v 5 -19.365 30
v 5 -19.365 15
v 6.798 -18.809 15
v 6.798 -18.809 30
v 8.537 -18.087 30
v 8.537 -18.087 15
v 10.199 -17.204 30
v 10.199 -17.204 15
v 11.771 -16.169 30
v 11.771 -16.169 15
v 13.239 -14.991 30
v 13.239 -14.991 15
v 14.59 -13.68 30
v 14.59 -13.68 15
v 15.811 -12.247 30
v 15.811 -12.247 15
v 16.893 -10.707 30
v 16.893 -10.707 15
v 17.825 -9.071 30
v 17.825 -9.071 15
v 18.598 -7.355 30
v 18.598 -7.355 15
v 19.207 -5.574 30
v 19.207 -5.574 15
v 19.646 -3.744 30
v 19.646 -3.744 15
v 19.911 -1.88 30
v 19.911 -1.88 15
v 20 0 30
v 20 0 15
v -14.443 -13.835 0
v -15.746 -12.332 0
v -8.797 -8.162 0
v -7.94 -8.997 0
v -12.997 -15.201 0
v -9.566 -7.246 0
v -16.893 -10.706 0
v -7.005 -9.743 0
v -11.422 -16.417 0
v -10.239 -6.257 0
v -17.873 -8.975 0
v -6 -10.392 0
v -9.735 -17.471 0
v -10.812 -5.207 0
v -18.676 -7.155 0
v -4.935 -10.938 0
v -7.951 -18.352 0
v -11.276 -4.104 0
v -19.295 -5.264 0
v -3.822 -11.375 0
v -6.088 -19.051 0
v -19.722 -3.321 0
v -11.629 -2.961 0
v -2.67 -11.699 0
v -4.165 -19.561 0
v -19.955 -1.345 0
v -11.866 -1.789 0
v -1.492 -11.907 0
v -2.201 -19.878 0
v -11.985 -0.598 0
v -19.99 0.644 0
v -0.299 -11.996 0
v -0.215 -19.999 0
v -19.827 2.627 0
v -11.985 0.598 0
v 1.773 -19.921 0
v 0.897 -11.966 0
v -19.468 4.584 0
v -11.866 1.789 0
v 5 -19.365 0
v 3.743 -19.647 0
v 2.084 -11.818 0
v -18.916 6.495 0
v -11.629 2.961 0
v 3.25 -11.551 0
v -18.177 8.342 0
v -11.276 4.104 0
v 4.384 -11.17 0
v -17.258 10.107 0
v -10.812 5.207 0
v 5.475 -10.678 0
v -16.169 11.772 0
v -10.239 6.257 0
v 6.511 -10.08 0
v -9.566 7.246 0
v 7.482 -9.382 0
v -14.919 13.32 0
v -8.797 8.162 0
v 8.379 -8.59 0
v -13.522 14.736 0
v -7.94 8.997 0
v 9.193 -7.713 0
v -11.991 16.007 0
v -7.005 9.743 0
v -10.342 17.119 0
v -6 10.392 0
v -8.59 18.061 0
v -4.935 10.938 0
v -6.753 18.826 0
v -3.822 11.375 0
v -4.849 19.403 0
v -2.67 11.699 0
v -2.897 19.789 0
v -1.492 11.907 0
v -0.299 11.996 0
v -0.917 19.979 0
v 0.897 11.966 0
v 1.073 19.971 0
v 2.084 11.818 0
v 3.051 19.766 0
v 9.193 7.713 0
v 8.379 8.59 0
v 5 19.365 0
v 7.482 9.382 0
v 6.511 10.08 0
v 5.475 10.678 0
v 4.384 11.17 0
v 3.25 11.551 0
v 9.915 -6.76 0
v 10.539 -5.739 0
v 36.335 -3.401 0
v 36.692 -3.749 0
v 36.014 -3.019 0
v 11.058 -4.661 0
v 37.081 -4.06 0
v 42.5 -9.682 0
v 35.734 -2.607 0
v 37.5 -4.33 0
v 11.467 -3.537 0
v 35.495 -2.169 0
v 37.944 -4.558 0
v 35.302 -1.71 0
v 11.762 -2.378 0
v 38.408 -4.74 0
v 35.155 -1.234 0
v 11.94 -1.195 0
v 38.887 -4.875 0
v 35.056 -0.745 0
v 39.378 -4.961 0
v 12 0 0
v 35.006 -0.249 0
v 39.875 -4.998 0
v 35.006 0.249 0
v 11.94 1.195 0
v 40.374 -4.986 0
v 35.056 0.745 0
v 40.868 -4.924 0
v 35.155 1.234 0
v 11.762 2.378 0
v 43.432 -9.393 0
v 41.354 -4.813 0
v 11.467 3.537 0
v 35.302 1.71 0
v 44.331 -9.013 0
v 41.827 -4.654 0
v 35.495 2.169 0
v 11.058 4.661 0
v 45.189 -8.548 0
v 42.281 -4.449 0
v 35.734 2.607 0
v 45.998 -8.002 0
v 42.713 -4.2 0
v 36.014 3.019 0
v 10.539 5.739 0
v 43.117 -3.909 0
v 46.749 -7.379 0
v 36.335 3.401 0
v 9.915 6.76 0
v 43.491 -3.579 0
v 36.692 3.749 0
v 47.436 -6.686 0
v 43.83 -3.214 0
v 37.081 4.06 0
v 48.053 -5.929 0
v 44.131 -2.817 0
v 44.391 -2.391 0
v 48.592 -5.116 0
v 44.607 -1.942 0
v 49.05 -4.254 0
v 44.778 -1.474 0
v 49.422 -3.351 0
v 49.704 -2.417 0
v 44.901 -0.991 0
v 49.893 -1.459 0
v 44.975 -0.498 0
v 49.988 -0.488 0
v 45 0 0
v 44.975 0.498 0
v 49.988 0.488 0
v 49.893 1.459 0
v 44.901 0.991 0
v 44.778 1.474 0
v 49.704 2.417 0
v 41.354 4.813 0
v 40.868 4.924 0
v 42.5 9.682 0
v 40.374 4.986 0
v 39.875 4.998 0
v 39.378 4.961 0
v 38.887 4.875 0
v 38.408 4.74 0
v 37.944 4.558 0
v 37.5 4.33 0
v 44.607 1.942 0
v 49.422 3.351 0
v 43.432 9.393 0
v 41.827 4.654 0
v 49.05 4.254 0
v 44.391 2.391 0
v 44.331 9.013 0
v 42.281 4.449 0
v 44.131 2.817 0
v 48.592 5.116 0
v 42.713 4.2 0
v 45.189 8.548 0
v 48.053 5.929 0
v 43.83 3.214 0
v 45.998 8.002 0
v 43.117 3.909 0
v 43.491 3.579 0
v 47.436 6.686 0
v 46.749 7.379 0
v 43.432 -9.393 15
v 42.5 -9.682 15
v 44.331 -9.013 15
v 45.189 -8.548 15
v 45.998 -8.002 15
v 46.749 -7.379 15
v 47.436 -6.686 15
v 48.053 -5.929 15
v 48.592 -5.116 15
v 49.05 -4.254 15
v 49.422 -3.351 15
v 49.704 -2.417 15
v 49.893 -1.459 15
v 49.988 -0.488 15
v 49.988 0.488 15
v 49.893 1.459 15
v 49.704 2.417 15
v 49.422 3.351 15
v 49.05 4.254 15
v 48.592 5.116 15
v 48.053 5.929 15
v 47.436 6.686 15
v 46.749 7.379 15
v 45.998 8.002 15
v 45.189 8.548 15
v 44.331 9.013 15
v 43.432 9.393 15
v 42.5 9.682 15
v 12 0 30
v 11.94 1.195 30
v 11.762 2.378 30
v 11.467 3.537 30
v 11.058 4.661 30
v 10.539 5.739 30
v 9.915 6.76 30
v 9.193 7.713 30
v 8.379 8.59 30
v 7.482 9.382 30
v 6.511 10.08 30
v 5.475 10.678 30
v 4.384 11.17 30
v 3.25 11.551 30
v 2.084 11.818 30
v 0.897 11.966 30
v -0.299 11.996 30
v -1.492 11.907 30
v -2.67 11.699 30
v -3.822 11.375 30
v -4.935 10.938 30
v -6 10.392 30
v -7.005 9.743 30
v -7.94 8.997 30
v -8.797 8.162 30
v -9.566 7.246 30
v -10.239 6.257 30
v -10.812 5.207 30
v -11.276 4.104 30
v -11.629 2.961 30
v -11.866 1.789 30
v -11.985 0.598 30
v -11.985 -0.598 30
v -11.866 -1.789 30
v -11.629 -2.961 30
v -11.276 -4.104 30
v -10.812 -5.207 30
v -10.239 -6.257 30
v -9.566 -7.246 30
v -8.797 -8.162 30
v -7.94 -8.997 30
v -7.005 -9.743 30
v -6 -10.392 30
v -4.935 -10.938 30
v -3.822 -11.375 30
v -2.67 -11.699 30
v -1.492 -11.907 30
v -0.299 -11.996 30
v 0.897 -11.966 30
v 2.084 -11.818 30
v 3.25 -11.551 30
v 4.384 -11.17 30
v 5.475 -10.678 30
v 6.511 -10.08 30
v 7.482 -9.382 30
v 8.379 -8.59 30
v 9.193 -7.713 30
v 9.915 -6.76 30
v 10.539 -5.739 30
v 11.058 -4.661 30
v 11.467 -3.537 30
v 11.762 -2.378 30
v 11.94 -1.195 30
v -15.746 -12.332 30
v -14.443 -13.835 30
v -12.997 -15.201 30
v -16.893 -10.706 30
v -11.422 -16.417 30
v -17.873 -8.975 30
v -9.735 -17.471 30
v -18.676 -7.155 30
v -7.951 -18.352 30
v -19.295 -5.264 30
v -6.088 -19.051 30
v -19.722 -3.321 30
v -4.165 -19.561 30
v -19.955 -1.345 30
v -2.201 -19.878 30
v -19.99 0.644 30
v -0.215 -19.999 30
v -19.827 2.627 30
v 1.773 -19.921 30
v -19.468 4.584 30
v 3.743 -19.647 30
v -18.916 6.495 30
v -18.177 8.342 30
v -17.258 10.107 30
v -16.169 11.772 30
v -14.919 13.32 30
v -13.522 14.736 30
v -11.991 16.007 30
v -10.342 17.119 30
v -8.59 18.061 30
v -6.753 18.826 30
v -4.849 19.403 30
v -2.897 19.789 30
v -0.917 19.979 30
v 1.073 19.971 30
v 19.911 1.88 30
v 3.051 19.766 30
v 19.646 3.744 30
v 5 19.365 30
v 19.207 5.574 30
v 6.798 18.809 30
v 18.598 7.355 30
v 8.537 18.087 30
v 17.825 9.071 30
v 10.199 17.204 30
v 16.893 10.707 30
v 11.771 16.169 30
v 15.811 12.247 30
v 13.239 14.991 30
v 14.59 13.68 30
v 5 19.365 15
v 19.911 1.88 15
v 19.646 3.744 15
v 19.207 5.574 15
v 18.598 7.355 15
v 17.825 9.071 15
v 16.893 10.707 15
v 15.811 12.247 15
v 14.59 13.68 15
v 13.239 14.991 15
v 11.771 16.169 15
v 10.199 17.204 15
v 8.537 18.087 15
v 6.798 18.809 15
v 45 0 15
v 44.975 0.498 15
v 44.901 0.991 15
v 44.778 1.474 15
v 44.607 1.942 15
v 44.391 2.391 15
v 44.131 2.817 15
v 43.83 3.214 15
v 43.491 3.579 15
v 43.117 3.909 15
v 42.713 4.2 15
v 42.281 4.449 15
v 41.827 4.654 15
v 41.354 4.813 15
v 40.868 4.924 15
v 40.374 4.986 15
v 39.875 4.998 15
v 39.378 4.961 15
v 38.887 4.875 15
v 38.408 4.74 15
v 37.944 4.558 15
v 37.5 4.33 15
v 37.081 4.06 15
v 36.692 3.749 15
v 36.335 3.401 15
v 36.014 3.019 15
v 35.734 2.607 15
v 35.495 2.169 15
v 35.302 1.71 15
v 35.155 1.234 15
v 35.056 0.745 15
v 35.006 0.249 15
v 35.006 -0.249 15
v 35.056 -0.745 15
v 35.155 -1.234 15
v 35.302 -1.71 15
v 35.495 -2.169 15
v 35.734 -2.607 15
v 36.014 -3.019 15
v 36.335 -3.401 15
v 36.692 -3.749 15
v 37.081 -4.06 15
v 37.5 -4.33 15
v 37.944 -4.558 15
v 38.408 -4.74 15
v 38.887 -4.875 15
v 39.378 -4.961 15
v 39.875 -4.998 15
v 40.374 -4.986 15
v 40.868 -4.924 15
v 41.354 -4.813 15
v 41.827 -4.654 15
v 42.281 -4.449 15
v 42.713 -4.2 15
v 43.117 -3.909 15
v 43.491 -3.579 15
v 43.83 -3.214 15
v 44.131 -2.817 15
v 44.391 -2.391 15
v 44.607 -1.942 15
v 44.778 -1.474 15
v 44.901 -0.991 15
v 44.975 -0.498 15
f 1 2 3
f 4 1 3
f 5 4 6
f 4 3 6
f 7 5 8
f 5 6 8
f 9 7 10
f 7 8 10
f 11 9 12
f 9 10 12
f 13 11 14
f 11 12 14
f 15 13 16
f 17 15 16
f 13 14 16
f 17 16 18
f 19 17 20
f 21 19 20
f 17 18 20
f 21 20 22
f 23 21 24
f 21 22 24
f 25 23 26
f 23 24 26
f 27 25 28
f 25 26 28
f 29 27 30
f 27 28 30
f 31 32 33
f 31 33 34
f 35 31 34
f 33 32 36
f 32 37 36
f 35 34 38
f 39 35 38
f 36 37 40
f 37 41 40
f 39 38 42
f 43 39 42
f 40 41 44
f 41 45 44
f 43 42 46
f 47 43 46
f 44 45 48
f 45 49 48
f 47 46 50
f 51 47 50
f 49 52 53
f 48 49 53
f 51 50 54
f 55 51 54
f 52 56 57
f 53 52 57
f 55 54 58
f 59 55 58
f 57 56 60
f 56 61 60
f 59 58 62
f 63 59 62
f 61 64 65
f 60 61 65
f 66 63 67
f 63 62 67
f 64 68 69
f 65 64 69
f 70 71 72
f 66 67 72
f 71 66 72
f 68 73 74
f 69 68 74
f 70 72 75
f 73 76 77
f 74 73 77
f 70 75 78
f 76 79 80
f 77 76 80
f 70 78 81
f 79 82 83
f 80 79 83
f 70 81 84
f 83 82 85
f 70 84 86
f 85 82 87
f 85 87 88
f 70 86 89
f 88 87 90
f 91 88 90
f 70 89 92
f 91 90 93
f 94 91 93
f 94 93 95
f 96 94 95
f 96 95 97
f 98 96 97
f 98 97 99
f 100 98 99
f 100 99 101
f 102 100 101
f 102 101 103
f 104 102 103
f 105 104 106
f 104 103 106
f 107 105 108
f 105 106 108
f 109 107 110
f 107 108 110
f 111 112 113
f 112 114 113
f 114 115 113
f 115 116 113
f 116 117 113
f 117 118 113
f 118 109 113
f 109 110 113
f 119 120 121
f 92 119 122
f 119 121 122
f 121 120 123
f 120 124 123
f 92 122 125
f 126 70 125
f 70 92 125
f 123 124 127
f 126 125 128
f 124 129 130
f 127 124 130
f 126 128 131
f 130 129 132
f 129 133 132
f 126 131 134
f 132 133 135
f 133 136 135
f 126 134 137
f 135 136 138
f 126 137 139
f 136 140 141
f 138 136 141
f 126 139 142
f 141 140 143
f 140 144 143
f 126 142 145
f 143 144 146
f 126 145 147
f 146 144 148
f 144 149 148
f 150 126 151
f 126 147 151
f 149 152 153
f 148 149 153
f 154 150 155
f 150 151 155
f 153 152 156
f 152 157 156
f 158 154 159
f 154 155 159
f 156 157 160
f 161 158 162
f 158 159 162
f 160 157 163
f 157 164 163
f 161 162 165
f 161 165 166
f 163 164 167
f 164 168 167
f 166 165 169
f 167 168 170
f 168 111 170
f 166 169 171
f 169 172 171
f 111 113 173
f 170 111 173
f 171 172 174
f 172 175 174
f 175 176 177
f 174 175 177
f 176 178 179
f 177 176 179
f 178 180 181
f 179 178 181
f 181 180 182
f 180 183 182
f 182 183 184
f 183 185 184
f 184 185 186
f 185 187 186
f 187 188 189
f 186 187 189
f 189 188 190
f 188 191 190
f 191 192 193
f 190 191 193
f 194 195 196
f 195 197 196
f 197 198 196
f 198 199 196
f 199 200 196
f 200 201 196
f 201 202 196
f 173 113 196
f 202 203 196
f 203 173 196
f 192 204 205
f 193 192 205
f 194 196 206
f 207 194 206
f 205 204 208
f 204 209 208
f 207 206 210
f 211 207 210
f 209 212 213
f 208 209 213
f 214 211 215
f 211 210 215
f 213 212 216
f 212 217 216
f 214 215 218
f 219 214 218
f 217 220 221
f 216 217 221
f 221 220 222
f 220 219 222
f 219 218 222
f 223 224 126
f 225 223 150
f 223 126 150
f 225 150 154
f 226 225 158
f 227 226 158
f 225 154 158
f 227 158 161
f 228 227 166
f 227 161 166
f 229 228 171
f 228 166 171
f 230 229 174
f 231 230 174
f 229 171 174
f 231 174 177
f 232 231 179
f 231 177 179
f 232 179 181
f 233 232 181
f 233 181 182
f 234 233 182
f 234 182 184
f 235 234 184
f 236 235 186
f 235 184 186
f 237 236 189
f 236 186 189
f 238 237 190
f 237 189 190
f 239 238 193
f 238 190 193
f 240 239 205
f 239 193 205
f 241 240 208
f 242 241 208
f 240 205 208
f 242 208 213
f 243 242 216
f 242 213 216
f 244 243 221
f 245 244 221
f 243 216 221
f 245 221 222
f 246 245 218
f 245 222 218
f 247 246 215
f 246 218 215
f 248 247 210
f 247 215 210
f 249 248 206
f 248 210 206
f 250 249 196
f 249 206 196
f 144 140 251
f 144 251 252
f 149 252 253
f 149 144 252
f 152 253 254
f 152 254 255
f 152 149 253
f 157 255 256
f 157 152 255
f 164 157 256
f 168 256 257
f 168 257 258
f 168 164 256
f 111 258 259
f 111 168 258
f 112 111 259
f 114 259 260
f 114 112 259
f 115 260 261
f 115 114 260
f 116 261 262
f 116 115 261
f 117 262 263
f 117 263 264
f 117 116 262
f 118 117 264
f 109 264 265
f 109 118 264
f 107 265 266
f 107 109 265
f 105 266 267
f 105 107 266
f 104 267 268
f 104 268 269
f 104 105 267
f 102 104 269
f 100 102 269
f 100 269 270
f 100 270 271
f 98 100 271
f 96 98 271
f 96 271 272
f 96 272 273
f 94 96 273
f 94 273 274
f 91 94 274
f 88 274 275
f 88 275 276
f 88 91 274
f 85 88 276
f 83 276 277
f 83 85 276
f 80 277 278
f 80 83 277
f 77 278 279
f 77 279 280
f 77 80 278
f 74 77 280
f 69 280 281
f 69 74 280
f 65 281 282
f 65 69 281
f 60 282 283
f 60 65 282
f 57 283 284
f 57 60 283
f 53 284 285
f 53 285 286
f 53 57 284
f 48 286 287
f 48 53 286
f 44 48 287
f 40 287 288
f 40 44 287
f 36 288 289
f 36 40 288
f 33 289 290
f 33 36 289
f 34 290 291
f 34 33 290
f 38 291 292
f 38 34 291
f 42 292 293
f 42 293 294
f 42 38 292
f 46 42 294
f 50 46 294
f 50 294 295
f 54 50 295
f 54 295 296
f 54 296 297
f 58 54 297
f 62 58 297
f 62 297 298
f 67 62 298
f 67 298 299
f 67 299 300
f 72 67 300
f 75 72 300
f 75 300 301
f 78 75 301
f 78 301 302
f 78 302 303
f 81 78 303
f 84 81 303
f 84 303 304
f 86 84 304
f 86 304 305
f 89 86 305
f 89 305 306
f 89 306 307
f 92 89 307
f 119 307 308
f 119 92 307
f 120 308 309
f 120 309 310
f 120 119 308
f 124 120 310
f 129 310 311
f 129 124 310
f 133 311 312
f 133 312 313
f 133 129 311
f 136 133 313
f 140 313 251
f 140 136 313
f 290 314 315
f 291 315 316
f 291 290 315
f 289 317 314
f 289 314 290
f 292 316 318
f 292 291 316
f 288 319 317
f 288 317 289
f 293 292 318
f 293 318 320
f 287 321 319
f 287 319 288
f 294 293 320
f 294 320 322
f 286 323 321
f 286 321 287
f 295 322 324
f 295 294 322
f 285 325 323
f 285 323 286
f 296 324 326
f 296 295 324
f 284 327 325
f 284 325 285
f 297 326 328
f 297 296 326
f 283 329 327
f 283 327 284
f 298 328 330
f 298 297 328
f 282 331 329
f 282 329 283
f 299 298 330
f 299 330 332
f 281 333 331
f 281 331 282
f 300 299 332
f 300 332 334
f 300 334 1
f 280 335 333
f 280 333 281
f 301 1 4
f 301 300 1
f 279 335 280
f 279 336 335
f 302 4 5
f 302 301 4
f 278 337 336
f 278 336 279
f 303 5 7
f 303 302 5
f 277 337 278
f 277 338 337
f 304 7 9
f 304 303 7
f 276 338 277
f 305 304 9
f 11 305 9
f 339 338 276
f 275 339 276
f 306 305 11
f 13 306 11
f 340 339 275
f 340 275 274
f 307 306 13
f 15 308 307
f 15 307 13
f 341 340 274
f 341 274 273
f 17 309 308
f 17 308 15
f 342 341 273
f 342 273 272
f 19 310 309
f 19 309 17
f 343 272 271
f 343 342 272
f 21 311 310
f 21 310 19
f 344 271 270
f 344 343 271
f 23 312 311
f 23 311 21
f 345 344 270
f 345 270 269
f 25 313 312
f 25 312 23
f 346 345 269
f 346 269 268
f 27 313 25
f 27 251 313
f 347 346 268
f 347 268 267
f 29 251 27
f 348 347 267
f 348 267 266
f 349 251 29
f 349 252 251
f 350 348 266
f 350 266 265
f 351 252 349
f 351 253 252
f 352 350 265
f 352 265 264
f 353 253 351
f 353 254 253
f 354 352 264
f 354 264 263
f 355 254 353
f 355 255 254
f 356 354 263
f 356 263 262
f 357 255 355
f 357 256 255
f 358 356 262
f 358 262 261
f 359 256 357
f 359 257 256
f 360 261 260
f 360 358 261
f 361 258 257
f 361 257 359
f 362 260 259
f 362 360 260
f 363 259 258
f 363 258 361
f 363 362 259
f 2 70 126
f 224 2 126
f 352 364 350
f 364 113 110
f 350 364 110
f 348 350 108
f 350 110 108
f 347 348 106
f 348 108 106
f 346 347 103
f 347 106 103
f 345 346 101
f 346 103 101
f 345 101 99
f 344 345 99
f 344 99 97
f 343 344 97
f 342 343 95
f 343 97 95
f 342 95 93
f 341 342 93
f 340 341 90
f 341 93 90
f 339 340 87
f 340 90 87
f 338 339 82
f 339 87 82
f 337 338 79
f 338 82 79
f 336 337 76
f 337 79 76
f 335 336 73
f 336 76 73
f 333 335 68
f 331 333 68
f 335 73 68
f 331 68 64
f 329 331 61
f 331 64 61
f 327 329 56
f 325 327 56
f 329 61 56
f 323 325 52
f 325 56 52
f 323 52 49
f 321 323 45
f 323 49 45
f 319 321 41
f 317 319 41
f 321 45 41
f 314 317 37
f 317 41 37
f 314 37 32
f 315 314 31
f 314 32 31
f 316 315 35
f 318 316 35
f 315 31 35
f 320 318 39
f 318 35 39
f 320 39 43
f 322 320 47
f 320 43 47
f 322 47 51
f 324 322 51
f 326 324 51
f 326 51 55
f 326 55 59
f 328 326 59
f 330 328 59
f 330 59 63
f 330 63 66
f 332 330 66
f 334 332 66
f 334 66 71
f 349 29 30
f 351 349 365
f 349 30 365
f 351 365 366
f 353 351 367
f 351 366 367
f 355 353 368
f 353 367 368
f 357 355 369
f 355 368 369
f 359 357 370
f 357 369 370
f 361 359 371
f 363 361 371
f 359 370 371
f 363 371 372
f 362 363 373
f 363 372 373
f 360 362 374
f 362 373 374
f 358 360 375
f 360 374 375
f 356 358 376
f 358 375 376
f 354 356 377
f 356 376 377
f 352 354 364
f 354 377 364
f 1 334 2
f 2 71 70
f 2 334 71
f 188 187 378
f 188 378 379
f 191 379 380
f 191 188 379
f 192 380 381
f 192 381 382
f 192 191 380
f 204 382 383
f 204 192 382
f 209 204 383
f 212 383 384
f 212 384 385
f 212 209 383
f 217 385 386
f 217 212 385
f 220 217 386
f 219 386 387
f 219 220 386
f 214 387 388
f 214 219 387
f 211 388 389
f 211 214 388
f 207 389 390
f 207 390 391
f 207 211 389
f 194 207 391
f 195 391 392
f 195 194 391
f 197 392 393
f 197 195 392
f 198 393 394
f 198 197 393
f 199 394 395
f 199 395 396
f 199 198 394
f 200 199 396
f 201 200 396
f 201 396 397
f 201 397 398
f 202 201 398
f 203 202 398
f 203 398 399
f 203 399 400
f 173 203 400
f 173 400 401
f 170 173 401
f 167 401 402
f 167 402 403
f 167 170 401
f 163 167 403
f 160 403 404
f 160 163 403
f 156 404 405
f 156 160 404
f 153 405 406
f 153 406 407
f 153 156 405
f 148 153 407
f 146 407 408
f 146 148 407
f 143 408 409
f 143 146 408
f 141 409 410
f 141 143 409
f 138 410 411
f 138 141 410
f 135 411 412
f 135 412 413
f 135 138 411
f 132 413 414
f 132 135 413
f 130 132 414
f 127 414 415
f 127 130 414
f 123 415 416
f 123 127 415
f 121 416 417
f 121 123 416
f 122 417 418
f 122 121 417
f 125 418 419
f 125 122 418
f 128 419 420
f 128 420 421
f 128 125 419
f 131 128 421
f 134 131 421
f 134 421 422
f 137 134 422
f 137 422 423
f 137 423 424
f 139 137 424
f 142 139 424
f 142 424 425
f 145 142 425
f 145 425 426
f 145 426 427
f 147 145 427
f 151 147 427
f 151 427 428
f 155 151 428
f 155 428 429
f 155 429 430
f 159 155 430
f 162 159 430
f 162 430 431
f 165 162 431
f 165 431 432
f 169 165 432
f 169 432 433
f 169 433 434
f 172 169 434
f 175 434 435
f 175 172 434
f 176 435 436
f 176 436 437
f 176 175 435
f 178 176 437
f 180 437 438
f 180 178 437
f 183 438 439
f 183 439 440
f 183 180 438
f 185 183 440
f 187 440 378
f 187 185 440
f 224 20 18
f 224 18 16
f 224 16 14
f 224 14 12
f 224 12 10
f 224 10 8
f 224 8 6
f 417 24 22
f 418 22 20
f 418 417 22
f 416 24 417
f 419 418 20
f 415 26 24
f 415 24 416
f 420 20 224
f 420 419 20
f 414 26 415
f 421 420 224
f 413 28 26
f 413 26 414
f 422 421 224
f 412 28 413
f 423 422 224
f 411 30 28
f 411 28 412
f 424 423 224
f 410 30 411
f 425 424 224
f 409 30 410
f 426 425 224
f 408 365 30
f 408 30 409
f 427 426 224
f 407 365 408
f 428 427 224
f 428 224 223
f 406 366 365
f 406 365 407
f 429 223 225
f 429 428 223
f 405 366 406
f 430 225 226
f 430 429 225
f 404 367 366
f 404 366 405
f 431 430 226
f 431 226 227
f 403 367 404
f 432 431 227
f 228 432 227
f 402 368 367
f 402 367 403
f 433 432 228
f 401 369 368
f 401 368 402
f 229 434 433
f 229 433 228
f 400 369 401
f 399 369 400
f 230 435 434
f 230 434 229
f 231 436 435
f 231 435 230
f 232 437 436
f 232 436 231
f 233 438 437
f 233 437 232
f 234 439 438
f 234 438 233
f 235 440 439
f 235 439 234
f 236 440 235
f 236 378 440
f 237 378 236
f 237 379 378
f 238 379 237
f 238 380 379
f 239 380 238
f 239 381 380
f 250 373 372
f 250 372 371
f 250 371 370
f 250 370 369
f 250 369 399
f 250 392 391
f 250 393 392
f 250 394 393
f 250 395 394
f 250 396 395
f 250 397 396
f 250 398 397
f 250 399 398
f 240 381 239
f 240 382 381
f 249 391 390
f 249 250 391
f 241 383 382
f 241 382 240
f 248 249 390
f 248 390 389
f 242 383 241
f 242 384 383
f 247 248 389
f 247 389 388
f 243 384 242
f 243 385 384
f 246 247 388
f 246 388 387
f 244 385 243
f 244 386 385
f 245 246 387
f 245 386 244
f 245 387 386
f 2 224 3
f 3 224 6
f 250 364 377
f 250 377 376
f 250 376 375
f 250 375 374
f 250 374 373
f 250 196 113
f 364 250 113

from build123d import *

# Parameters (mm, degrees)
F0_R     = 5
F1_DEPTH = 15
F0_R_2   = 12
F2_DEPTH = 30


with BuildPart() as f1:
    # F0 (on Top) → F1 (new body)
    with BuildSketch(Plane.XY):
        with BuildLine():
            ThreePointArc((5, 19.364917), (15.811388, 12.247449), (20, 0))
            ThreePointArc((20, 0), (15.811388, -12.247449), (5, -19.364917))
            Line((5, -19.364917), (42.5, -9.682458))
            ThreePointArc((42.5, -9.682458), (50, 0), (42.5, 9.682458))
            Line((42.5, 9.682458), (5, 19.364917))
        make_face()
        with Locations((40, 0)):
            Circle(F0_R, mode=Mode.SUBTRACT)
    extrude(amount=F1_DEPTH)

    # F0 (on Top) → F2 (join)
    with BuildSketch(Plane.XY):
        with BuildLine():
            ThreePointArc((5, -19.364917), (15.811388, -12.247449), (20, 0))
            ThreePointArc((20, 0), (15.811388, 12.247449), (5, 19.364917))
            ThreePointArc((5, 19.364917), (-19.989625, 0.644109), (3.742964, -19.646634))
            Line((3.742964, -19.646634), (5, -19.364917))
        make_face()
        Circle(F0_R_2, mode=Mode.SUBTRACT)
    extrude(amount=F2_DEPTH)


solid = f1.part
